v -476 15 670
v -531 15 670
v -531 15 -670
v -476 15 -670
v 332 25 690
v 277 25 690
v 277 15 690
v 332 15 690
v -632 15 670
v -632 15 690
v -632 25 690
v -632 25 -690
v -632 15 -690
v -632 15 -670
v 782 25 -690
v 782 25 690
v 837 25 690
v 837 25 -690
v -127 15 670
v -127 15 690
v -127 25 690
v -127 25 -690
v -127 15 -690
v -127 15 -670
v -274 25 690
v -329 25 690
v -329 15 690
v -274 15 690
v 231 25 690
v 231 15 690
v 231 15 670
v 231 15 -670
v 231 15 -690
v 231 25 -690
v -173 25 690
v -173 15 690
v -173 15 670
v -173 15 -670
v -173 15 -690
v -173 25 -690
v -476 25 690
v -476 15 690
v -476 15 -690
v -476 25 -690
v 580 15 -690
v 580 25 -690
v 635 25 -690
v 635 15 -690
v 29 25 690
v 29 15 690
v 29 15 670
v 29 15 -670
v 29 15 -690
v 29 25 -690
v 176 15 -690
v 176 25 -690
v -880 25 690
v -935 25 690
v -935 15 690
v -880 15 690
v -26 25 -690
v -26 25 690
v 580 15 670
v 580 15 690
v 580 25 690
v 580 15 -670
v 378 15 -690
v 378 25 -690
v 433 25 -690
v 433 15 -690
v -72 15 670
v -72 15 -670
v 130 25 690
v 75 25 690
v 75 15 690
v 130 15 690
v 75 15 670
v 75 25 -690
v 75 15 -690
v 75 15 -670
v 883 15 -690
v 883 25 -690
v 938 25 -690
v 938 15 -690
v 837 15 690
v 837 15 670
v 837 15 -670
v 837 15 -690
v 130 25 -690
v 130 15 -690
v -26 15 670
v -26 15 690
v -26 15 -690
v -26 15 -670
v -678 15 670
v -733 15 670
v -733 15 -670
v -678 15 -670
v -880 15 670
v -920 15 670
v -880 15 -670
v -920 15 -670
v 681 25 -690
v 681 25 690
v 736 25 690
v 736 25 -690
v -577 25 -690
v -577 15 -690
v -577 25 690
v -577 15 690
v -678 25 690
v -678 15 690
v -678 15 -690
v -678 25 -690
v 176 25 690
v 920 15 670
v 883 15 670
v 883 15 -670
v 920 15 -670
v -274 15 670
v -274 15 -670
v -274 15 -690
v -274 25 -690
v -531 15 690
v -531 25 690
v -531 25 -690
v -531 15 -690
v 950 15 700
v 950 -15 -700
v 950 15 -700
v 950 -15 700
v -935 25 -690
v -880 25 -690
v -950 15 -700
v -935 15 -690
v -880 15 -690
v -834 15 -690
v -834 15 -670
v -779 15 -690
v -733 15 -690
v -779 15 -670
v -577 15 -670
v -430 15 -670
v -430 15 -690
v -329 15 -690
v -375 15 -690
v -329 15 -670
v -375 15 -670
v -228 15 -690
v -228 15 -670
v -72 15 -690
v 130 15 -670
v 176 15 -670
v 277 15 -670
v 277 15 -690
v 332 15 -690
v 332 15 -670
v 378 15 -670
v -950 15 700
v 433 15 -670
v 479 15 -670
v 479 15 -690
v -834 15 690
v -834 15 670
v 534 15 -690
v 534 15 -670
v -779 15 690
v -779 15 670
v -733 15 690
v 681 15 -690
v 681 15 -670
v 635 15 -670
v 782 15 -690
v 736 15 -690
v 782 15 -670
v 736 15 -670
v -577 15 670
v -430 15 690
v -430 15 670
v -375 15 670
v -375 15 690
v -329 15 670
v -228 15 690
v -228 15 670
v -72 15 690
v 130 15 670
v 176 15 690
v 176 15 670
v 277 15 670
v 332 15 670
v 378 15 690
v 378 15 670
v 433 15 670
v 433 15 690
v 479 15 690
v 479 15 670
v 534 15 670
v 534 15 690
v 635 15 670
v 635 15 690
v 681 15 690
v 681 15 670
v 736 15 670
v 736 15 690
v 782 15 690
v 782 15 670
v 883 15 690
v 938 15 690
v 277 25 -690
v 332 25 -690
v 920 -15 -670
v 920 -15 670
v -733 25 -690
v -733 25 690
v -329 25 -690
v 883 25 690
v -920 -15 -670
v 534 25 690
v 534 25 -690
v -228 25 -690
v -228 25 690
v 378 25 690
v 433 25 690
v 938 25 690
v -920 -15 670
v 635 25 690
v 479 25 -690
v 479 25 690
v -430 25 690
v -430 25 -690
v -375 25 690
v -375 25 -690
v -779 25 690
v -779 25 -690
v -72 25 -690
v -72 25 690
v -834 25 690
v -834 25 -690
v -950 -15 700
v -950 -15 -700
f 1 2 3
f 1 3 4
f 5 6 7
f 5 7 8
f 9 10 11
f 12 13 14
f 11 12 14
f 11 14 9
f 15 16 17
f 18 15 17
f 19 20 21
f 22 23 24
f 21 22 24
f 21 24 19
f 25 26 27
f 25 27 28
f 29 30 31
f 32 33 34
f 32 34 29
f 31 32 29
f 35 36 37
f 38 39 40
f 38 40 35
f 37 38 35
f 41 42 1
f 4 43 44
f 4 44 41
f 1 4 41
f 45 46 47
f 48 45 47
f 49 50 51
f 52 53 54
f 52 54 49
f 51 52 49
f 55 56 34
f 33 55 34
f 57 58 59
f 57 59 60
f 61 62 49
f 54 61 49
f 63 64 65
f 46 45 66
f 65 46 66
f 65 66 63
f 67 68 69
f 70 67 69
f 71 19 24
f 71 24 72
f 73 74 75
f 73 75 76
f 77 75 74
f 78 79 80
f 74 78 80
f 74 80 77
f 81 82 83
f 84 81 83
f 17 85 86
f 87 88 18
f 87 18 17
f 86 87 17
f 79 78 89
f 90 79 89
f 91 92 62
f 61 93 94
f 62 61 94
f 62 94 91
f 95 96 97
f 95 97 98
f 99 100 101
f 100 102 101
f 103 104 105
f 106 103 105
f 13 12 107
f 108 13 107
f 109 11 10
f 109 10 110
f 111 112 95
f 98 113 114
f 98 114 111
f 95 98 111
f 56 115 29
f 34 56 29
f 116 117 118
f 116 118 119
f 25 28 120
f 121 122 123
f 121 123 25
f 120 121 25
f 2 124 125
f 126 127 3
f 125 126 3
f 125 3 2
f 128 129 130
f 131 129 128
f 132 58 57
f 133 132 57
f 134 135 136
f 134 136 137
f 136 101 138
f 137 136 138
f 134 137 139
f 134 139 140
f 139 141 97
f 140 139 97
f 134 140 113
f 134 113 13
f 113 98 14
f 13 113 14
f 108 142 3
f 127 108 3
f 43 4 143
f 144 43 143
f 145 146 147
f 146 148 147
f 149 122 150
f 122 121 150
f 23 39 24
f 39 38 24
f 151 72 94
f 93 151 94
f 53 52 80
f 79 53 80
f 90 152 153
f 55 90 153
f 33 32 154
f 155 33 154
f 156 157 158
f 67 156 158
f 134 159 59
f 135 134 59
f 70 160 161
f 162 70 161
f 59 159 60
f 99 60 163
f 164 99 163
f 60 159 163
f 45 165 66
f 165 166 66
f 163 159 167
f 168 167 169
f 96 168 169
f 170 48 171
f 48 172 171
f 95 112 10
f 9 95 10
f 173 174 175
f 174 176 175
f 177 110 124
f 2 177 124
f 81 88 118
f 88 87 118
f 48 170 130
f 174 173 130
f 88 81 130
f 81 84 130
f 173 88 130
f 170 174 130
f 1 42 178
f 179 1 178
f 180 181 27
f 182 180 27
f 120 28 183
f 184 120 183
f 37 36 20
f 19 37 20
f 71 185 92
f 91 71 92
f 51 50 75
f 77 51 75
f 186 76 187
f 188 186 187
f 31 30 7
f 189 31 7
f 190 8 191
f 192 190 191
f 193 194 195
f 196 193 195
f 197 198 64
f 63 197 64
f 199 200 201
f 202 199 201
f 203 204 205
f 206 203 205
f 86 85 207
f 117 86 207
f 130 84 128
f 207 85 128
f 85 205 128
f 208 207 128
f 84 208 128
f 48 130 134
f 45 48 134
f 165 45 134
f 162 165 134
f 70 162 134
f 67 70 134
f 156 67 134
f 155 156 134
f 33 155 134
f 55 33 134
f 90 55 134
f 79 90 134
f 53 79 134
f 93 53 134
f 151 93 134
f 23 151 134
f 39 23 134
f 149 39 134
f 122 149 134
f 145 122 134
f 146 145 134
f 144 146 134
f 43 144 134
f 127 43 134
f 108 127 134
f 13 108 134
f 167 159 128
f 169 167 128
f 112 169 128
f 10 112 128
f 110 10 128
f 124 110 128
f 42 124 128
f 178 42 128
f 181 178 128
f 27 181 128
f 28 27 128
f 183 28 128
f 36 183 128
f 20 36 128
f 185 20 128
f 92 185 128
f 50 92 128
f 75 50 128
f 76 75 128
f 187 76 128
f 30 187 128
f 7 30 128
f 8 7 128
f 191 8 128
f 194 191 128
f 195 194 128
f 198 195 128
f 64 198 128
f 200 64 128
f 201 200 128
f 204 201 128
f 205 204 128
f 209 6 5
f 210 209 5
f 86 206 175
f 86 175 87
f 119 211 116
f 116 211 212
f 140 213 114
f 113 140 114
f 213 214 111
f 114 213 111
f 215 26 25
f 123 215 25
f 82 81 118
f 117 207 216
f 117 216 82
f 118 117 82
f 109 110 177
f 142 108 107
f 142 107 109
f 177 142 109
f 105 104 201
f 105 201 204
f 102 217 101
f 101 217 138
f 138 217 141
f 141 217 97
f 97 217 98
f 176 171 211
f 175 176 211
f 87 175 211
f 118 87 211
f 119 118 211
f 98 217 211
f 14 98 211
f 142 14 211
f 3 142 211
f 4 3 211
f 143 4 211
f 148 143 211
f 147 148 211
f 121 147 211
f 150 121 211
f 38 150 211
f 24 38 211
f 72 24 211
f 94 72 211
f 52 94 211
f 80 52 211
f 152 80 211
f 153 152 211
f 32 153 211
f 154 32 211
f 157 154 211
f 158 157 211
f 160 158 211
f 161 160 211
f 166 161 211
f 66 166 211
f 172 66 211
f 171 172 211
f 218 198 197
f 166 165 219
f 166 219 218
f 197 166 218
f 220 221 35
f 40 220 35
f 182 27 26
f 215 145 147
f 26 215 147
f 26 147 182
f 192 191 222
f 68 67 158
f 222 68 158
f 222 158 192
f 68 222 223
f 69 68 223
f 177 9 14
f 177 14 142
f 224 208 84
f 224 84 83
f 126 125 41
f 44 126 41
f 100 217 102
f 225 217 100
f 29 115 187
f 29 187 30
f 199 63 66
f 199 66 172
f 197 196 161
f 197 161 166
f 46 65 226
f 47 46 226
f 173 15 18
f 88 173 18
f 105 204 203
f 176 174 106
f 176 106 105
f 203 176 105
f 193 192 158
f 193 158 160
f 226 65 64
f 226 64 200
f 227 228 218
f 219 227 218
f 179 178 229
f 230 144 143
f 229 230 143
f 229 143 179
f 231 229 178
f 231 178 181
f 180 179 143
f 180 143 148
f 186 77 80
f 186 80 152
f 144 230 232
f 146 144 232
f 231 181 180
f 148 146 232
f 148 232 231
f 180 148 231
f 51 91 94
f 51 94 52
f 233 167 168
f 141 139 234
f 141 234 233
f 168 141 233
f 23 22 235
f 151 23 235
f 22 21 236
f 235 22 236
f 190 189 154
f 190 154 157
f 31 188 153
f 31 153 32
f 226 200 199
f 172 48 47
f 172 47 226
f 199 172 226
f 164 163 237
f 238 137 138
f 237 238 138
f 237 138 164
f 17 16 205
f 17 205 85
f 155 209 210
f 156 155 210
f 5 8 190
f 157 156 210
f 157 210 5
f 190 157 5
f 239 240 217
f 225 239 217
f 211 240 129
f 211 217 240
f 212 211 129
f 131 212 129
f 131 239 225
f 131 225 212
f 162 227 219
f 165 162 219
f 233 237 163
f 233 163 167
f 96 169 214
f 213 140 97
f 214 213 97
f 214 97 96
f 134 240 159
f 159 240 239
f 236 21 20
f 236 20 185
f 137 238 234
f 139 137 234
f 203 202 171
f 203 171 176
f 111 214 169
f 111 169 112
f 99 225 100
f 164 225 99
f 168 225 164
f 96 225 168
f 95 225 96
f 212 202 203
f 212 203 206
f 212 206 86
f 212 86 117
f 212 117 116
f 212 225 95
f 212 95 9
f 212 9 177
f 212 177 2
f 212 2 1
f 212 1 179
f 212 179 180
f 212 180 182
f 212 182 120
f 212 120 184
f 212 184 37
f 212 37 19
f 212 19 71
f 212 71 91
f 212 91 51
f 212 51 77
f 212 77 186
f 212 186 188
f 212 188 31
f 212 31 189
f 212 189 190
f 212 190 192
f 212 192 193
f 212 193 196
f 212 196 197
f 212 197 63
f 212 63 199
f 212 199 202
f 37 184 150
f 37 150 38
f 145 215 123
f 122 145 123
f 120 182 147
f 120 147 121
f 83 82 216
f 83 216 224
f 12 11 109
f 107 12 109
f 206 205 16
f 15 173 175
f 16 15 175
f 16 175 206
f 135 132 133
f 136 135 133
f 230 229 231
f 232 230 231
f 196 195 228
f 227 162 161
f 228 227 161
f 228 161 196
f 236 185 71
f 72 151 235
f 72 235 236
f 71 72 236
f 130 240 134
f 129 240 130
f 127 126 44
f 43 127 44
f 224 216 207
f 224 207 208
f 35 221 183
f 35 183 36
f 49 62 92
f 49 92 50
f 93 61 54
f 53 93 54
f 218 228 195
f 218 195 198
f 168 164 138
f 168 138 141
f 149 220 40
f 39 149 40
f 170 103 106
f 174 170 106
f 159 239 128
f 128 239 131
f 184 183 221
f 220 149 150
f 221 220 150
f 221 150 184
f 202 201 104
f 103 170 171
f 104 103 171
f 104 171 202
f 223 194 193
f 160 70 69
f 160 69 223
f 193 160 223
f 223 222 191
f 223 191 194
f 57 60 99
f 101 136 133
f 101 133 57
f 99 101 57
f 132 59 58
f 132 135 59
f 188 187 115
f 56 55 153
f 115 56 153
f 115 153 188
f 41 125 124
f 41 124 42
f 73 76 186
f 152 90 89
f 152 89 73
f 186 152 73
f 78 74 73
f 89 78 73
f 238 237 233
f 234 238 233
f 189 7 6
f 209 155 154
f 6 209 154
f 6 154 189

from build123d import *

# Parameters (mm, degrees)
F0_W     = 1900
F0_H     = 1400
F0_W_2   = 1840
F0_H_2   = 1340
F1_DEPTH = 15
F2_W     = 55
F2_H     = 10
F3_DEPTH = 690


# Not quite as in the source:
# - a feature names something its author has since deleted; it is built from what else it names


with BuildPart() as f1:
    # F0 (on Front) → F1 (new body, symmetric)
    with BuildSketch(Plane.XZ):
        Rectangle(F0_W, F0_H)
        Rectangle(F0_W_2, F0_H_2, mode=Mode.SUBTRACT)
    extrude(amount=F1_DEPTH, both=True)

    # F2 (on Top) → F3 (join, symmetric)
    with BuildSketch(Plane.XY):
        with Locations((-907.5, 20)):
            Rectangle(F2_W, F2_H)
        with Locations((-806.5, 20)):
            Rectangle(F2_W, F2_H)
        with Locations((-705.5, 20)):
            Rectangle(F2_W, F2_H)
        with Locations((-604.5, 20)):
            Rectangle(F2_W, F2_H)
        with Locations((-503.5, 20)):
            Rectangle(F2_W, F2_H)
        with Locations((-402.5, 20)):
            Rectangle(F2_W, F2_H)
        with Locations((-301.5, 20)):
            Rectangle(F2_W, F2_H)
        with Locations((-200.5, 20)):
            Rectangle(F2_W, F2_H)
        with Locations((-99.5, 20)):
            Rectangle(F2_W, F2_H)
        with Locations((1.5, 20)):
            Rectangle(F2_W, F2_H)
        with Locations((102.5, 20)):
            Rectangle(F2_W, F2_H)
        with Locations((203.5, 20)):
            Rectangle(F2_W, F2_H)
        with Locations((304.5, 20)):
            Rectangle(F2_W, F2_H)
        with Locations((405.5, 20)):
            Rectangle(F2_W, F2_H)
        with Locations((506.5, 20)):
            Rectangle(F2_W, F2_H)
        with Locations((607.5, 20)):
            Rectangle(F2_W, F2_H)
        with Locations((708.5, 20)):
            Rectangle(F2_W, F2_H)
        with Locations((809.5, 20)):
            Rectangle(F2_W, F2_H)
        with Locations((910.5, 20)):
            Rectangle(F2_W, F2_H)
    extrude(amount=F3_DEPTH, both=True)


solid = f1.part
